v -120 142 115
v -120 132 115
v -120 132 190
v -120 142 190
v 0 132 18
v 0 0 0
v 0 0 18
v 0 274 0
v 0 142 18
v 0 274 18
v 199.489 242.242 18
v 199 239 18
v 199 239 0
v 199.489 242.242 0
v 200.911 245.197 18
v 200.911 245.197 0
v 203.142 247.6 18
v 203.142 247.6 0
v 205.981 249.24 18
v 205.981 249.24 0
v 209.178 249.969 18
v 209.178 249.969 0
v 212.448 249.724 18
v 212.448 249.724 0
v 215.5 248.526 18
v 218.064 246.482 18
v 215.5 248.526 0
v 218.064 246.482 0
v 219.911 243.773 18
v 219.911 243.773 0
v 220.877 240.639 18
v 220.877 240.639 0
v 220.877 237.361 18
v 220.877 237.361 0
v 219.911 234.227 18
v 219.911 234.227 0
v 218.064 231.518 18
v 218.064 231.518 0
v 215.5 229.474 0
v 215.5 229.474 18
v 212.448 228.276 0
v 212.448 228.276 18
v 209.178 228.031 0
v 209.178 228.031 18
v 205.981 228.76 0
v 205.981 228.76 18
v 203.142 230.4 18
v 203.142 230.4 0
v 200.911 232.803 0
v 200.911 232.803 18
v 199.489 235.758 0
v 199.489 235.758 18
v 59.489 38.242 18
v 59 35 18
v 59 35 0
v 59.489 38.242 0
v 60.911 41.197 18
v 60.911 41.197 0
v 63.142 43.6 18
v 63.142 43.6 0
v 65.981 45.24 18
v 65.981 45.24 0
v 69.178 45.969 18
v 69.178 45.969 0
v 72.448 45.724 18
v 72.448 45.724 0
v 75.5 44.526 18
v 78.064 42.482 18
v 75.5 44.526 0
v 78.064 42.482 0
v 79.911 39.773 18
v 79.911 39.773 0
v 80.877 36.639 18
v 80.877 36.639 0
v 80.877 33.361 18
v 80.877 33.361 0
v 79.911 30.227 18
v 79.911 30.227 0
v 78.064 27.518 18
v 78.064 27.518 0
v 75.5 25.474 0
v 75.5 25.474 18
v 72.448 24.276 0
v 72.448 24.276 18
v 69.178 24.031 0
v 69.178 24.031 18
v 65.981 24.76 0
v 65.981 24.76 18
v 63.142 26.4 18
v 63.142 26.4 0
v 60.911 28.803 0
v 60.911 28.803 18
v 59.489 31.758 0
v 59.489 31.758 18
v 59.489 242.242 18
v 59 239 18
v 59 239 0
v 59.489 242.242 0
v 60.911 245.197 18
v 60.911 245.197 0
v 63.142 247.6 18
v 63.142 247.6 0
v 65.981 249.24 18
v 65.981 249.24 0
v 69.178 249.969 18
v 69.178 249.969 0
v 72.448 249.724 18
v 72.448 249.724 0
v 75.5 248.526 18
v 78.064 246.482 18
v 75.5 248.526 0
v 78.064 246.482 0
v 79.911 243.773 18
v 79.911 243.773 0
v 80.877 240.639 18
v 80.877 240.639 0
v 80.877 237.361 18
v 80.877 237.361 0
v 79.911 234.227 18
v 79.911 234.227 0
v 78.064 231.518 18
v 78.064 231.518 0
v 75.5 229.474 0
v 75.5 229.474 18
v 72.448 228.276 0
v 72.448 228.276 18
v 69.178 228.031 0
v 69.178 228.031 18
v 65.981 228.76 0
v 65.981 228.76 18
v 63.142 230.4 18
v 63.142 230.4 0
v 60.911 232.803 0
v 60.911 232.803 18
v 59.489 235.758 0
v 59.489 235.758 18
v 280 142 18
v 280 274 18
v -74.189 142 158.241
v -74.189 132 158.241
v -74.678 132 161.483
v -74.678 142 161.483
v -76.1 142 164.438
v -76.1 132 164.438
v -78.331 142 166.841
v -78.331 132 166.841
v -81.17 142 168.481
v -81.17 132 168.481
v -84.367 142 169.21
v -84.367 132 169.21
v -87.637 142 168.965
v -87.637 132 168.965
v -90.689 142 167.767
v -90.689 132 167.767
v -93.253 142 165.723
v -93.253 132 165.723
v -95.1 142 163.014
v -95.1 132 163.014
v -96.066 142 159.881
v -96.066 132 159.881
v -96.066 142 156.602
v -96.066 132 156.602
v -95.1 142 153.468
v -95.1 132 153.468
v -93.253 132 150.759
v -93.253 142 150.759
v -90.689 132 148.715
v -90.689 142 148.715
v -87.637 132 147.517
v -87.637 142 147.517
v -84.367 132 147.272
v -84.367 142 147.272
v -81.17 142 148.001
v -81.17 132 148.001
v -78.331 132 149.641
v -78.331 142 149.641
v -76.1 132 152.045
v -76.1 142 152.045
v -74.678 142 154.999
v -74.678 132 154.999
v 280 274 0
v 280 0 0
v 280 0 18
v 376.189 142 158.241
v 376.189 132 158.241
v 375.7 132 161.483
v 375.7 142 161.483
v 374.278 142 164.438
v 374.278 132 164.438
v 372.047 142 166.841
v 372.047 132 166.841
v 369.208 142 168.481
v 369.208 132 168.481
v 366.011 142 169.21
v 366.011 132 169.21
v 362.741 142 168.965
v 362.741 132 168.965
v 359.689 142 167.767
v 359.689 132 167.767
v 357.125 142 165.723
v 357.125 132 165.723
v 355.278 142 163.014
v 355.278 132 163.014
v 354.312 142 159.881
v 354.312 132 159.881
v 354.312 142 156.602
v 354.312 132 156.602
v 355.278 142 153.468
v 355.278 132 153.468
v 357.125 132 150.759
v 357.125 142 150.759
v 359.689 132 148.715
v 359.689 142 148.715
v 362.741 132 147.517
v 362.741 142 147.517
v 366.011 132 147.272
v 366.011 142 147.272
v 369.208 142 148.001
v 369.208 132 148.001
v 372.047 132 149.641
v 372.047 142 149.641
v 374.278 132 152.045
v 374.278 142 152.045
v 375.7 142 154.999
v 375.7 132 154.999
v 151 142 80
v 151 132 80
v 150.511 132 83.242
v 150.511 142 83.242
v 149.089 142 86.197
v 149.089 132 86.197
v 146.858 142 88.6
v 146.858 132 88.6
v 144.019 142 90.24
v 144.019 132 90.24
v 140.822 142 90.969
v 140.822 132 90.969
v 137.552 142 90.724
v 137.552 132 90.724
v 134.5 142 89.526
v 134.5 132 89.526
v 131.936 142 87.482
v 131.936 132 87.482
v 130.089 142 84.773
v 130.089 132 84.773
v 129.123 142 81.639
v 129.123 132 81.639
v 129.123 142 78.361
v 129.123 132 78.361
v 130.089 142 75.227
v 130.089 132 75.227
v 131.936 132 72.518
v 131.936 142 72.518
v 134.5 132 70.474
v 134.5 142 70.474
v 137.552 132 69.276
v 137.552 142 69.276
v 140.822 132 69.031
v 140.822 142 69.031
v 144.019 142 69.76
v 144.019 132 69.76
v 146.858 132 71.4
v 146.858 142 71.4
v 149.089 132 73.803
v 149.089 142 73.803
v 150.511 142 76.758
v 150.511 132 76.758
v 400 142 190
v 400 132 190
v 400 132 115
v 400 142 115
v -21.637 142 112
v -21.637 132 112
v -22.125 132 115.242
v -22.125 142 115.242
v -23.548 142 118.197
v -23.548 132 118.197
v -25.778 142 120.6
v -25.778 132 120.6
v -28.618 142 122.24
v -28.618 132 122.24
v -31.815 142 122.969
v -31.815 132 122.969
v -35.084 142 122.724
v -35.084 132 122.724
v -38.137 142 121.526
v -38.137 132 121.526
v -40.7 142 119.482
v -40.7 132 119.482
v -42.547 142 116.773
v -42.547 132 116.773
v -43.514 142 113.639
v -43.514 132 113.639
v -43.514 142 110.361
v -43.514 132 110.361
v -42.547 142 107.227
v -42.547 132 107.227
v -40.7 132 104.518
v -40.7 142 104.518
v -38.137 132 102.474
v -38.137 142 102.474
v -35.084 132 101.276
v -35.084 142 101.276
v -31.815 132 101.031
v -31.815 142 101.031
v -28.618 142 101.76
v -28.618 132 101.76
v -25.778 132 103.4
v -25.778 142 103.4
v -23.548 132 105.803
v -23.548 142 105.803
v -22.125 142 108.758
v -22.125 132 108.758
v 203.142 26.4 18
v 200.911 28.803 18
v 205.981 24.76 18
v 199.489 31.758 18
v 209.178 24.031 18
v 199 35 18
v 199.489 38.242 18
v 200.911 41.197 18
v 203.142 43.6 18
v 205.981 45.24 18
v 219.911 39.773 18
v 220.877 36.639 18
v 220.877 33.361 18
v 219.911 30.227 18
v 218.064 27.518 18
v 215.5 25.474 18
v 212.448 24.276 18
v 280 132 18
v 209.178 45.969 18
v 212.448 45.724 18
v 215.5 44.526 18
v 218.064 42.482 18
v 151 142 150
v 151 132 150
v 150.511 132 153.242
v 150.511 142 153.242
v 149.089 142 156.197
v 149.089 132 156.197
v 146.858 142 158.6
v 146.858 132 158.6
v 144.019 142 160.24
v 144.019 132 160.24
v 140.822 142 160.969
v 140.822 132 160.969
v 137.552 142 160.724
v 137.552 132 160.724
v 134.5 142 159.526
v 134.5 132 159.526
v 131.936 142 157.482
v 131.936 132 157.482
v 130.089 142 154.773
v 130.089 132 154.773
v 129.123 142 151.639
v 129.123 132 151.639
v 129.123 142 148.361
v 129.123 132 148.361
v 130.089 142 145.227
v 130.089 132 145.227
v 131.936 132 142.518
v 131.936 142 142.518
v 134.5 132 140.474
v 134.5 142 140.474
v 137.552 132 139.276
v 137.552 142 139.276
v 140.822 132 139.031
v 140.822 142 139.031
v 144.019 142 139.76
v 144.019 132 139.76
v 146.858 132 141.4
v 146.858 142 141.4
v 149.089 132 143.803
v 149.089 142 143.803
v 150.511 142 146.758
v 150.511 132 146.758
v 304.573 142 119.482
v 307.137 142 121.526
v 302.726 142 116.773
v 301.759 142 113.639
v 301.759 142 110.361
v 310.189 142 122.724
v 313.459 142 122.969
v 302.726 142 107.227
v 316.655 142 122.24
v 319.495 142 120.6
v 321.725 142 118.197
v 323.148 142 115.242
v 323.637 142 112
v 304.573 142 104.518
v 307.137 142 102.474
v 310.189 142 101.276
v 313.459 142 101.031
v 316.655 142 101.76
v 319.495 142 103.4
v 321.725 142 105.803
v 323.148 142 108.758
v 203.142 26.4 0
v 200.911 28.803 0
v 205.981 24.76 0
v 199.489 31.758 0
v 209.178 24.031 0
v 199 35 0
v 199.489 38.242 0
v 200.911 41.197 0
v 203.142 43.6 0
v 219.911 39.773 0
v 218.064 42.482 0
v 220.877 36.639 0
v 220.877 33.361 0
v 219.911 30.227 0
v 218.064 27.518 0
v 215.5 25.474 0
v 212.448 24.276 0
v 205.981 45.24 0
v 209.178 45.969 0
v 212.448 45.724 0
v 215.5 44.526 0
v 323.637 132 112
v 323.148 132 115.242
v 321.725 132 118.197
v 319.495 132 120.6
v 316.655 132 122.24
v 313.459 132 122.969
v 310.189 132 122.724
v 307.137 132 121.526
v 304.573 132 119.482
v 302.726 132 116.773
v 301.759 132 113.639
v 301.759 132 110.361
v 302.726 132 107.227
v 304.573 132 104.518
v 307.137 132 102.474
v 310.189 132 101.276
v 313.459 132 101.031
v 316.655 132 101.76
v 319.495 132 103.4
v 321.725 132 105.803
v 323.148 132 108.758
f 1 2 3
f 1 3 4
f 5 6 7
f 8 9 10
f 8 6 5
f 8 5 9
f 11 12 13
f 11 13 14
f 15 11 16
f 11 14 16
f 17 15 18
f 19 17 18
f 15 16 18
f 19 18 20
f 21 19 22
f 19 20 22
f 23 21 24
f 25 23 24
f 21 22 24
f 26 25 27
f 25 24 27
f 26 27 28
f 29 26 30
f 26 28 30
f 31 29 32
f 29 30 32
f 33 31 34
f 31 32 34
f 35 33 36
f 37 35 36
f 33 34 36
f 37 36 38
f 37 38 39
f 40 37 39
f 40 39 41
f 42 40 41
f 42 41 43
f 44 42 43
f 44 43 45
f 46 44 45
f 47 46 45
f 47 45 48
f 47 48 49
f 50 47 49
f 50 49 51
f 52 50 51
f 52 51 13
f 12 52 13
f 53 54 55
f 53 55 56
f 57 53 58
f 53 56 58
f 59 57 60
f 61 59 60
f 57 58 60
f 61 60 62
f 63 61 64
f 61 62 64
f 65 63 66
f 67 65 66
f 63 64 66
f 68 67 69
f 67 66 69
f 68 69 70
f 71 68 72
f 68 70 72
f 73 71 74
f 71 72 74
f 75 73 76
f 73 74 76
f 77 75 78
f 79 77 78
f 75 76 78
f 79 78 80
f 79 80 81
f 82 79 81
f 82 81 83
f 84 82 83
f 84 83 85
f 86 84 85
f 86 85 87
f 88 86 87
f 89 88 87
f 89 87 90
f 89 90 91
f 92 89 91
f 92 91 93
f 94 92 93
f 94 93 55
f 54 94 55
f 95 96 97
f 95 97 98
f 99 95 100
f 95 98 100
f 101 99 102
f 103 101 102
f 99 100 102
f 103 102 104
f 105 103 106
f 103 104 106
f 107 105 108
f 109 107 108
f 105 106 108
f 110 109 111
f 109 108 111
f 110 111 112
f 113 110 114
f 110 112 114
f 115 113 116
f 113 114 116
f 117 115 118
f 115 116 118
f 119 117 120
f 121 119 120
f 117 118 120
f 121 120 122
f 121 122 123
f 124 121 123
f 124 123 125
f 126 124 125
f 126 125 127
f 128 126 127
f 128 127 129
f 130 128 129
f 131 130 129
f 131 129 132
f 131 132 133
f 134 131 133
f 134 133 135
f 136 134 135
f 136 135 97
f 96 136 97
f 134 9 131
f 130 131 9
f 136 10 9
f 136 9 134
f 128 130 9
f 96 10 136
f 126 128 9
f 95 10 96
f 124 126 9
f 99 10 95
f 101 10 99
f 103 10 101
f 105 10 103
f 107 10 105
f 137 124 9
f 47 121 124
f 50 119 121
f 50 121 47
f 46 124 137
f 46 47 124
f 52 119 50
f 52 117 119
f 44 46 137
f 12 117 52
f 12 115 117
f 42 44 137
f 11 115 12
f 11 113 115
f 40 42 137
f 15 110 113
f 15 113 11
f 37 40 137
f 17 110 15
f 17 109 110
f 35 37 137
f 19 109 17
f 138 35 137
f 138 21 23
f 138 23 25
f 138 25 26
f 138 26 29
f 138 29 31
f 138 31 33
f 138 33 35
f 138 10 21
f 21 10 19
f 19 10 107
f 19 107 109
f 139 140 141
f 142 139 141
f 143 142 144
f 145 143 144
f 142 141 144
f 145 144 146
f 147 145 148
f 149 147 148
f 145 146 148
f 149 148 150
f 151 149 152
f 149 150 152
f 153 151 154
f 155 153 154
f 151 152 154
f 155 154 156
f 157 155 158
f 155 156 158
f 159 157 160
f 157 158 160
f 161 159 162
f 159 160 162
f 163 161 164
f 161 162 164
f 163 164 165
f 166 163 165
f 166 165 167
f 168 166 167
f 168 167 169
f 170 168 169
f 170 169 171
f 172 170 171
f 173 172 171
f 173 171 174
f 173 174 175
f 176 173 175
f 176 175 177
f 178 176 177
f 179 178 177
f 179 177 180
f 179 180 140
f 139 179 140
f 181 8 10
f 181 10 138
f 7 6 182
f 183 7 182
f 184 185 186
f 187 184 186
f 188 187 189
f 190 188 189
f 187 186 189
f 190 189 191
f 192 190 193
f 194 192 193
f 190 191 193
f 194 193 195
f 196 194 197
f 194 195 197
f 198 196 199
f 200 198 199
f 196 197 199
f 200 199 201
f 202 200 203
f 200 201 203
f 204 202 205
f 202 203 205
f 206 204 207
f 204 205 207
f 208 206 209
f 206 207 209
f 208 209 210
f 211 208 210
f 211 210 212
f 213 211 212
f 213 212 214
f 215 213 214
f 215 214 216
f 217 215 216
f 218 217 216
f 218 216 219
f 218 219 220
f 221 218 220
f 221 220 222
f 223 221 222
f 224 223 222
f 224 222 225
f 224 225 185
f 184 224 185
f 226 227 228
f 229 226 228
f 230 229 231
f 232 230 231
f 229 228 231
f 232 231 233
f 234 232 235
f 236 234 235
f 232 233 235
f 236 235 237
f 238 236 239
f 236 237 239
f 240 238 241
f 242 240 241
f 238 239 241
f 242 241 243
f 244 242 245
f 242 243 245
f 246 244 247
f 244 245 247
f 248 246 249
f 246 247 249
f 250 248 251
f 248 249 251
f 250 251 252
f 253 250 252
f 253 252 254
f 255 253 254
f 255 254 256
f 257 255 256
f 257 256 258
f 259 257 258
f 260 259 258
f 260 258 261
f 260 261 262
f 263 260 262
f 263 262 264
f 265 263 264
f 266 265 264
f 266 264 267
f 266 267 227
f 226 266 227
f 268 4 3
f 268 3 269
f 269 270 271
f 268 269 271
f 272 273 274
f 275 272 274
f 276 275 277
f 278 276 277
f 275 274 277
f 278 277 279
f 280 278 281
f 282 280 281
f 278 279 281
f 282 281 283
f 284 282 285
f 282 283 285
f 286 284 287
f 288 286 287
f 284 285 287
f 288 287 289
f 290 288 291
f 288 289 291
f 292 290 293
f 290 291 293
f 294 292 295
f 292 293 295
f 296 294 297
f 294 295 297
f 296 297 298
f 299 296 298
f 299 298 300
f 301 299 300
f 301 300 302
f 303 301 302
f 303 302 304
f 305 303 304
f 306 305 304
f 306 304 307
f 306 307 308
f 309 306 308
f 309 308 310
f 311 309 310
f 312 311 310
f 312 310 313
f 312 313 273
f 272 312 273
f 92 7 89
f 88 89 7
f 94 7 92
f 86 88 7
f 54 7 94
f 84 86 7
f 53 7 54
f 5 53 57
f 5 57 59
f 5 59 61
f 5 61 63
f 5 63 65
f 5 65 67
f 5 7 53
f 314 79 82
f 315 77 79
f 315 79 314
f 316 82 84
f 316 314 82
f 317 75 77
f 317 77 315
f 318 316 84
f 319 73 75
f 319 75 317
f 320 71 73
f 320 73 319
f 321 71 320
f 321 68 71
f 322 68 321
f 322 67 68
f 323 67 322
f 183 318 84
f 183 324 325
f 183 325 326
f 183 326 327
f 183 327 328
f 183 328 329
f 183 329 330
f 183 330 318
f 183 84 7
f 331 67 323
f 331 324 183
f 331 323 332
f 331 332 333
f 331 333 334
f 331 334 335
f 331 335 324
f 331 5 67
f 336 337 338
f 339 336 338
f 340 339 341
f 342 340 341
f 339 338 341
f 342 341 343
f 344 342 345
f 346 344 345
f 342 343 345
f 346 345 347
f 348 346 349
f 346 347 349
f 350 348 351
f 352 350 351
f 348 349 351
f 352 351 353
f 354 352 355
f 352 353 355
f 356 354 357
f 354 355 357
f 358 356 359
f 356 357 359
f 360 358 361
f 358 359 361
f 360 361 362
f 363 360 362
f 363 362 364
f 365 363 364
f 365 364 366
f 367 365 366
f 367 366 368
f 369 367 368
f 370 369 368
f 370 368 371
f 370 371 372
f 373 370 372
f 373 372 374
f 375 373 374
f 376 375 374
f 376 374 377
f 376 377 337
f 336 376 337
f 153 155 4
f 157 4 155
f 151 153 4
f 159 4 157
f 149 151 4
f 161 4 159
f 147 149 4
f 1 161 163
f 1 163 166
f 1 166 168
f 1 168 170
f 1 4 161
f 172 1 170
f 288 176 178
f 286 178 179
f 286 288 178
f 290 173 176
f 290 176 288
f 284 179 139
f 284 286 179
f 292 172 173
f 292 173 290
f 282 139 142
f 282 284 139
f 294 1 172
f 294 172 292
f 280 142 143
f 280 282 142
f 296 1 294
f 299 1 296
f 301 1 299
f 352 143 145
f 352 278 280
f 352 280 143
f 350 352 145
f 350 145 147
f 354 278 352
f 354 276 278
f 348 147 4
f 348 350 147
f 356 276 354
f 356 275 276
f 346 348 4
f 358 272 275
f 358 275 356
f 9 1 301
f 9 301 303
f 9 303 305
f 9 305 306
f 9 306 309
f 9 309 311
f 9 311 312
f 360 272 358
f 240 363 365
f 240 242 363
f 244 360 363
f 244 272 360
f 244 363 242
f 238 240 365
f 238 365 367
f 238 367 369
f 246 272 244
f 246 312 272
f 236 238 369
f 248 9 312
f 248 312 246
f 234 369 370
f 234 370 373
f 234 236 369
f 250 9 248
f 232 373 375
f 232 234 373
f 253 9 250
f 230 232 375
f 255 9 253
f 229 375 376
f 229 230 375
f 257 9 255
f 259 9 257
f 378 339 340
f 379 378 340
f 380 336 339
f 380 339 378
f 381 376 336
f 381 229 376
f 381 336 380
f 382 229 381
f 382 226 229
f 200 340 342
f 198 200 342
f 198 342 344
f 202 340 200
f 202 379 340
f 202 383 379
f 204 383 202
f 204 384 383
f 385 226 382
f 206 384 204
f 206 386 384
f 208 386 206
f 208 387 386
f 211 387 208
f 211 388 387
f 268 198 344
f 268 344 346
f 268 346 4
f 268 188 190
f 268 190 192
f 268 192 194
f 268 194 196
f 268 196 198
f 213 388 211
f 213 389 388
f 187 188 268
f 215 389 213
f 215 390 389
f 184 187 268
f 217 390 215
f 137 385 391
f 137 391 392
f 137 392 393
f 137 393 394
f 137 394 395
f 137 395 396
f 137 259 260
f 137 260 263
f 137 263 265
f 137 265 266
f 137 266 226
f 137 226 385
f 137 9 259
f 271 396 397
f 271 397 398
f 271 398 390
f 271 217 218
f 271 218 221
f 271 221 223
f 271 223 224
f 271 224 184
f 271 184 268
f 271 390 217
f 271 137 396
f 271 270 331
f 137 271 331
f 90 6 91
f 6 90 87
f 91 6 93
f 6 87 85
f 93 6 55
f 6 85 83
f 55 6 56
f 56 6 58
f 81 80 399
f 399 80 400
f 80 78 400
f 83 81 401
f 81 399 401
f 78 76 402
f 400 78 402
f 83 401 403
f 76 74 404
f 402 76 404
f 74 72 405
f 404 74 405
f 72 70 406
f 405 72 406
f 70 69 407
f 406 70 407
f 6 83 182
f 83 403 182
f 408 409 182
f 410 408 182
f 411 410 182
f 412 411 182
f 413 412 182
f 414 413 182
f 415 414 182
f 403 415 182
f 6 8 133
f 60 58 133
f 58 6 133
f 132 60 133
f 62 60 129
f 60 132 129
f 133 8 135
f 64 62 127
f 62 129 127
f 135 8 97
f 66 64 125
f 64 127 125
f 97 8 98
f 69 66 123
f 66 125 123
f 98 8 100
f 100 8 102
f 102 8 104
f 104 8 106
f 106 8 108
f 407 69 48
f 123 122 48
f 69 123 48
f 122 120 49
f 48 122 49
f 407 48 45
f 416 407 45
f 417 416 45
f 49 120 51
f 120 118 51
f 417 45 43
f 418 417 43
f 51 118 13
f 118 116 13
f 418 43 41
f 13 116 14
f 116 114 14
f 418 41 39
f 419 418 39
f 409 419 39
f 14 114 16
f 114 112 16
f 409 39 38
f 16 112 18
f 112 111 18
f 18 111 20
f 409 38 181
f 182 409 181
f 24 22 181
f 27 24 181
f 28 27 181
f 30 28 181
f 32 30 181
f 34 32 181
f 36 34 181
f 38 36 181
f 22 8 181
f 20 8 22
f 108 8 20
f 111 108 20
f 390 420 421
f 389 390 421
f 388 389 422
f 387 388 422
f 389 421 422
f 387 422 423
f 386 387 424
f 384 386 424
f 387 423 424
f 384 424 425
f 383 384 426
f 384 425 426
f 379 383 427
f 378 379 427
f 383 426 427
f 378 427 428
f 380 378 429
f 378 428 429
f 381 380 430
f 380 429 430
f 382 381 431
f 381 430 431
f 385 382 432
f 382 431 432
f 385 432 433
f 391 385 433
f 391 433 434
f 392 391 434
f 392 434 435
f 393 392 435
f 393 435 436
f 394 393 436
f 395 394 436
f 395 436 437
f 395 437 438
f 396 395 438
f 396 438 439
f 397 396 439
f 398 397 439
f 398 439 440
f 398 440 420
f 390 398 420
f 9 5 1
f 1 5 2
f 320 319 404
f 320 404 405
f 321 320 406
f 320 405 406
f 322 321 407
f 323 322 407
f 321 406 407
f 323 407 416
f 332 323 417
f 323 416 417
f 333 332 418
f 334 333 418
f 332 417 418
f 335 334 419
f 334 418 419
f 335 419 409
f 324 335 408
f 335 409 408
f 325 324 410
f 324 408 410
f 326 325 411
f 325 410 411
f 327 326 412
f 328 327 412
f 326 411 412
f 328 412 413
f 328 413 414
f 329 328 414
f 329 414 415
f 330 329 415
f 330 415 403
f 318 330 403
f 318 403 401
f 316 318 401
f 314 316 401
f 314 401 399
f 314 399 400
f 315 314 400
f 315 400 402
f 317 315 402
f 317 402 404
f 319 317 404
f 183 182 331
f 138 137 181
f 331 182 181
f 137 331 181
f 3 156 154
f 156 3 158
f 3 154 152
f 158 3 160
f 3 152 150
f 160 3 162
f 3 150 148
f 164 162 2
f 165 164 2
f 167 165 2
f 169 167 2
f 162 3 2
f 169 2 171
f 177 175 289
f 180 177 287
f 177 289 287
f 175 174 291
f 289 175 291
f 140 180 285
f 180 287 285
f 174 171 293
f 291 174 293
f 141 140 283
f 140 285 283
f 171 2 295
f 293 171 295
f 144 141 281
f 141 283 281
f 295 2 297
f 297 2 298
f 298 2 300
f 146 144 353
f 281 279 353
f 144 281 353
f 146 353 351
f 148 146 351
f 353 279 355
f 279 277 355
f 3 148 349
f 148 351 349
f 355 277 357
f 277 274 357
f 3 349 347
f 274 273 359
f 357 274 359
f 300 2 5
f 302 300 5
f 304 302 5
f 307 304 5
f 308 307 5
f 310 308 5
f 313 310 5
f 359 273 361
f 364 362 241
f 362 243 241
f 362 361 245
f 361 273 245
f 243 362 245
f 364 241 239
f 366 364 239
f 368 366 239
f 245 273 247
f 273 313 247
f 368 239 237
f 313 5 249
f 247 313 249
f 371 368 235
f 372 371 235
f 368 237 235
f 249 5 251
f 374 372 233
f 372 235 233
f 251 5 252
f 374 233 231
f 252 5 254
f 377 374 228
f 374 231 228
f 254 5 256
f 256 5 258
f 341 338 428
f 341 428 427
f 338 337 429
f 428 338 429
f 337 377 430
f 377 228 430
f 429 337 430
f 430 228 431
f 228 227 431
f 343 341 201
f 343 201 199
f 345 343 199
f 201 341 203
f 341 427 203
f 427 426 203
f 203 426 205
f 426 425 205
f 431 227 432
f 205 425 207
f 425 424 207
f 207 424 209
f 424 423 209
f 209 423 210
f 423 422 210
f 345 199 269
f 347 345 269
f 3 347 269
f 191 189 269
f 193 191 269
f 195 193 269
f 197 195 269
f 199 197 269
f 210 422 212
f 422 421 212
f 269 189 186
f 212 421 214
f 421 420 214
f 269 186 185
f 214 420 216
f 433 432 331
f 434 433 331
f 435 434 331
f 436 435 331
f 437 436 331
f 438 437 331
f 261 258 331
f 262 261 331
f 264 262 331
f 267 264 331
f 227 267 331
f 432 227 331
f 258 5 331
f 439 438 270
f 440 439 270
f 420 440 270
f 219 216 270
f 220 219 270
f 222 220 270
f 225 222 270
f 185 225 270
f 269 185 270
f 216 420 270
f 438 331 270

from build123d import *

# Parameters (mm, degrees)
SKETCH_1_W          = 280
SKETCH_1_H          = 274
EXTRUDE_1_DEPTH     = 18
SKETCH_2_W          = 520
SKETCH_2_H          = 10
EXTRUDE_2_DEPTH     = 172
CUT_EXTRUDE_1_DEPTH = 466.041933593
CUT_EXTRUDE_2_DEPTH = 466.041933593
SKETCH_5_R          = 11
CUT_EXTRUDE_3_DEPTH = 521.745619281
SKETCH_6_R          = 11
CUT_EXTRUDE_4_DEPTH = 521.745619281
SKETCH_7_R          = 11
CUT_EXTRUDE_5_DEPTH = 521.745619281
SKETCH_8_R          = 11
CUT_EXTRUDE_6_DEPTH = 521.745619281
SKETCH_9_R          = 11
CUT_EXTRUDE_8_DEPTH = 466.041933593


with BuildPart() as part:
    # 草图1 → 拉伸1 (new body)
    with BuildSketch(Plane.XY):
        with Locations((140, 137)):
            Rectangle(SKETCH_1_W, SKETCH_1_H)
    extrude(amount=EXTRUDE_1_DEPTH)

    # 草图2 → 拉伸2 (add)
    with BuildSketch(Plane.XY.offset(18)):
        with Locations((140, 137)):
            Rectangle(SKETCH_2_W, SKETCH_2_H)
    extrude(amount=EXTRUDE_2_DEPTH)

    # 草图3 → 切除-拉伸1 (cut, through all)
    with BuildSketch(Plane.XZ.offset(-132)):
        Polygon((0, 18), (-120, 115), (-120, 18), align=None)
    extrude(amount=-CUT_EXTRUDE_1_DEPTH, mode=Mode.SUBTRACT)

    # 草图4 → 切除-拉伸2 (cut, through all)
    with BuildSketch(Plane.XZ.offset(-132)):
        Polygon((400, 115), (280, 18), (400, 18), align=None)
    extrude(amount=-CUT_EXTRUDE_2_DEPTH, mode=Mode.SUBTRACT)

    # 草图5 → 切除-拉伸3 (cut, through all)
    with BuildSketch(Plane(origin=(0, 0, 0), x_dir=(-1, 0, 0), z_dir=(0, 0, -1))):
        with Locations((-210, 35)):
            Circle(SKETCH_5_R)
    extrude(amount=-CUT_EXTRUDE_3_DEPTH, mode=Mode.SUBTRACT)

    # 草图6 → 切除-拉伸4 (cut, through all)
    with BuildSketch(Plane(origin=(0, 0, 0), x_dir=(-1, 0, 0), z_dir=(0, 0, -1))):
        with Locations((-210, 239)):
            Circle(SKETCH_6_R)
    extrude(amount=-CUT_EXTRUDE_4_DEPTH, mode=Mode.SUBTRACT)

    # 草图7 → 切除-拉伸5 (cut, through all)
    with BuildSketch(Plane(origin=(0, 0, 0), x_dir=(-1, 0, 0), z_dir=(0, 0, -1))):
        with Locations((-70, 35)):
            Circle(SKETCH_7_R)
    extrude(amount=-CUT_EXTRUDE_5_DEPTH, mode=Mode.SUBTRACT)

    # 草图8 → 切除-拉伸6 (cut, through all)
    with BuildSketch(Plane(origin=(0, 0, 0), x_dir=(-1, 0, 0), z_dir=(0, 0, -1))):
        with Locations((-70, 239)):
            Circle(SKETCH_8_R)
    extrude(amount=-CUT_EXTRUDE_6_DEPTH, mode=Mode.SUBTRACT)

    # 草图9 → 切除-拉伸8 (cut, through all)
    with BuildSketch(Plane.XZ.offset(-132)):
        with Locations((140, 80)):
            Circle(SKETCH_9_R)
        with Locations((140, 150)):
            Circle(SKETCH_9_R)
        with Locations((-85.189055636, 158.241096139)):
            Circle(SKETCH_9_R)
        with Locations((-32.636595866, 112)):
            Circle(SKETCH_9_R)
        with Locations((365.189055636, 158.241096139)):
            Circle(SKETCH_9_R)
        with Locations((312.636595866, 112)):
            Circle(SKETCH_9_R)
    extrude(amount=-CUT_EXTRUDE_8_DEPTH, mode=Mode.SUBTRACT)


solid = part.part
